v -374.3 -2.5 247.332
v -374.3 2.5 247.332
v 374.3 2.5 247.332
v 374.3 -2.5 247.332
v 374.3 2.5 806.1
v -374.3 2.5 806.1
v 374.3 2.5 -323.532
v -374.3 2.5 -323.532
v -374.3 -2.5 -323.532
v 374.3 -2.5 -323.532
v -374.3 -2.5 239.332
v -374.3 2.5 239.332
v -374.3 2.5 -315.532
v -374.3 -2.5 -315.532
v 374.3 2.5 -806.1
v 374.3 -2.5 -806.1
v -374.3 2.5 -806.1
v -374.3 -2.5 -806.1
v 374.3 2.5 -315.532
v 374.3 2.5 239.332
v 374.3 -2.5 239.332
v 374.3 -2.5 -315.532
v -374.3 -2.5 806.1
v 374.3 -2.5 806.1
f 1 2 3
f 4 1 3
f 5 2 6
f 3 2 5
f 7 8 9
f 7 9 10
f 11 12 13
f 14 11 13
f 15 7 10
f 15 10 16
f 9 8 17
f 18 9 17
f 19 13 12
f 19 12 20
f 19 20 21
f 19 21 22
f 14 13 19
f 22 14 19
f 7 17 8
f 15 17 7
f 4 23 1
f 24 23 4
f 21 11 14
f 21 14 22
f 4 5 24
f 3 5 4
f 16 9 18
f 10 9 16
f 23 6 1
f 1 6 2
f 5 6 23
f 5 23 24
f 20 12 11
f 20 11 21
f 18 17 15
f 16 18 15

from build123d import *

# Parameters (mm, degrees)
BOSS_EXTRUDE1_DEPTH             = 2.5
BOSS_EXTRUDE1_DEPTH_BACK        = 2.5
SKETCH1_W                       = 736.6
SKETCH1_H                       = 470.568
BOSS_EXTRUDE1_2_DEPTH           = 2.5
BOSS_EXTRUDE1_2_DEPTH_BACK      = 2.5
SKETCH1_H_2                     = 546.768
BOSS_EXTRUDE1_3_DEPTH           = 2.5
BOSS_EXTRUDE1_3_DEPTH_BACK      = 2.5
SKETCH1_H_3                     = 542.864
BOSS_EXTRUDE2_REACH             = 882.801
SKETCH2_W                       = 748.6
SKETCH2_H                       = 482.568
SKETCH2_W_2                     = 736.6
SKETCH2_H_2                     = 470.568
SKETCH2_H_3                     = 558.768
SKETCH2_H_4                     = 546.768
SKETCH2_H_5                     = 554.864
SKETCH2_H_6                     = 542.864
BOSS_EXTRUDE2_DIRECTION_2_REACH = 882.801


with BuildPart() as part:
    # Sketch1 → Boss-Extrude1 (new, two sides: drawn at the far end of the back side and taken through both)
    with BuildSketch(Plane(origin=(0, 0, 0), x_dir=(1, 0, 0), z_dir=(0, 1, 0)).offset(-BOSS_EXTRUDE1_DEPTH_BACK)):
        with Locations((0, 564.816)):
            Rectangle(SKETCH1_W, SKETCH1_H)
    extrude(amount=BOSS_EXTRUDE1_DEPTH + BOSS_EXTRUDE1_DEPTH_BACK)

    # Boss-Extrude2: up to this face of the body (flat: up to its plane)
    boss_extrude2_end = Plane(part.part.faces().sort_by_distance((0, 2.5, -564.816))[0])
    # Sketch2 → Boss-Extrude2 (add, up to the picked face)
    with BuildSketch(Plane(origin=(0, 0, 0), x_dir=(1, 0, 0), z_dir=(0, 1, 0)), mode=Mode.PRIVATE) as boss_extrude2_sk1:
        with Locations((0, 564.816)):
            Rectangle(SKETCH2_W, SKETCH2_H)
        with Locations((0, 564.816)):
            Rectangle(SKETCH2_W_2, SKETCH2_H_2, mode=Mode.SUBTRACT)
    boss_extrude2_tool1 = split(extrude(boss_extrude2_sk1.sketch, amount=BOSS_EXTRUDE2_REACH, mode=Mode.PRIVATE), bisect_by=boss_extrude2_end, keep=Keep.BOTH, mode=Mode.PRIVATE)
    # Sketch2 → Boss-Extrude2 (add, up to the picked face)
    with BuildSketch(Plane(origin=(0, 0, 0), x_dir=(1, 0, 0), z_dir=(0, 1, 0)), mode=Mode.PRIVATE) as boss_extrude2_sk2:
        with Locations((0, -526.716)):
            Rectangle(SKETCH2_W, SKETCH2_H_3)
        with Locations((0, -526.716)):
            Rectangle(SKETCH2_W_2, SKETCH2_H_4, mode=Mode.SUBTRACT)
    boss_extrude2_tool2 = split(extrude(boss_extrude2_sk2.sketch, amount=BOSS_EXTRUDE2_REACH, mode=Mode.PRIVATE), bisect_by=boss_extrude2_end, keep=Keep.BOTH, mode=Mode.PRIVATE)
    # Sketch2 → Boss-Extrude2 (add, up to the picked face)
    with BuildSketch(Plane(origin=(0, 0, 0), x_dir=(1, 0, 0), z_dir=(0, 1, 0)), mode=Mode.PRIVATE) as boss_extrude2_sk3:
        with Locations((0, 38.1)):
            Rectangle(SKETCH2_W, SKETCH2_H_5)
        with Locations((0, 38.1)):
            Rectangle(SKETCH2_W_2, SKETCH2_H_6, mode=Mode.SUBTRACT)
    boss_extrude2_tool3 = split(extrude(boss_extrude2_sk3.sketch, amount=BOSS_EXTRUDE2_REACH, mode=Mode.PRIVATE), bisect_by=boss_extrude2_end, keep=Keep.BOTH, mode=Mode.PRIVATE)


with BuildPart() as body_2:
    # Sketch1 → Boss-Extrude1 2 (new, two sides: drawn at the far end of the back side and taken through both)
    with BuildSketch(Plane(origin=(0, 0, 0), x_dir=(1, 0, 0), z_dir=(0, 1, 0)).offset(-BOSS_EXTRUDE1_2_DEPTH_BACK)):
        with Locations((0, -526.716)):
            Rectangle(SKETCH1_W, SKETCH1_H_2)
    extrude(amount=BOSS_EXTRUDE1_2_DEPTH + BOSS_EXTRUDE1_2_DEPTH_BACK)


with BuildPart() as body_3:
    # Sketch1 → Boss-Extrude1 3 (new, two sides: drawn at the far end of the back side and taken through both)
    with BuildSketch(Plane(origin=(0, 0, 0), x_dir=(1, 0, 0), z_dir=(0, 1, 0)).offset(-BOSS_EXTRUDE1_3_DEPTH_BACK)):
        with Locations((0, 38.1)):
            Rectangle(SKETCH1_W, SKETCH1_H_3)
    extrude(amount=BOSS_EXTRUDE1_3_DEPTH + BOSS_EXTRUDE1_3_DEPTH_BACK)


with BuildPart() as part_1:
    add(part.part)

    add(body_2.part)  # Boss-Extrude2 merges body 2

    add(body_3.part)  # Boss-Extrude2 merges body 3
    add(boss_extrude2_tool1.solids().sort_by(Axis((0, 0, -805.209341), (0, 1, 0)))[0])
    add(boss_extrude2_tool2.solids().sort_by(Axis((0, 0, 805.165857), (0, 1, 0)))[0])
    add(boss_extrude2_tool3.solids().sort_by(Axis((0, 0, -314.600187), (0, 1, 0)))[0])

    # Boss-Extrude2 direction 2: up to this face of the body (flat: up to its plane)
    boss_extrude2_direction_2_end = Plane(part_1.part.faces().sort_by_distance((0, -2.5, -564.816))[0])
    # Sketch2 → Boss-Extrude2 direction 2 (add, up to the picked face)
    with BuildSketch(Plane(origin=(0, 0, 0), x_dir=(1, 0, 0), z_dir=(0, 1, 0)), mode=Mode.PRIVATE) as boss_extrude2_direction_2_sk1:
        with Locations((0, 564.816)):
            Rectangle(SKETCH2_W, SKETCH2_H)
        with Locations((0, 564.816)):
            Rectangle(SKETCH2_W_2, SKETCH2_H_2, mode=Mode.SUBTRACT)
    boss_extrude2_direction_2_tool1 = split(extrude(boss_extrude2_direction_2_sk1.sketch, amount=-BOSS_EXTRUDE2_DIRECTION_2_REACH, mode=Mode.PRIVATE), bisect_by=boss_extrude2_direction_2_end, keep=Keep.BOTH, mode=Mode.PRIVATE)
    # Sketch2 → Boss-Extrude2 direction 2 (add, up to the picked face)
    with BuildSketch(Plane(origin=(0, 0, 0), x_dir=(1, 0, 0), z_dir=(0, 1, 0)), mode=Mode.PRIVATE) as boss_extrude2_direction_2_sk2:
        with Locations((0, -526.716)):
            Rectangle(SKETCH2_W, SKETCH2_H_3)
        with Locations((0, -526.716)):
            Rectangle(SKETCH2_W_2, SKETCH2_H_4, mode=Mode.SUBTRACT)
    boss_extrude2_direction_2_tool2 = split(extrude(boss_extrude2_direction_2_sk2.sketch, amount=-BOSS_EXTRUDE2_DIRECTION_2_REACH, mode=Mode.PRIVATE), bisect_by=boss_extrude2_direction_2_end, keep=Keep.BOTH, mode=Mode.PRIVATE)
    # Sketch2 → Boss-Extrude2 direction 2 (add, up to the picked face)
    with BuildSketch(Plane(origin=(0, 0, 0), x_dir=(1, 0, 0), z_dir=(0, 1, 0)), mode=Mode.PRIVATE) as boss_extrude2_direction_2_sk3:
        with Locations((0, 38.1)):
            Rectangle(SKETCH2_W, SKETCH2_H_5)
        with Locations((0, 38.1)):
            Rectangle(SKETCH2_W_2, SKETCH2_H_6, mode=Mode.SUBTRACT)
    boss_extrude2_direction_2_tool3 = split(extrude(boss_extrude2_direction_2_sk3.sketch, amount=-BOSS_EXTRUDE2_DIRECTION_2_REACH, mode=Mode.PRIVATE), bisect_by=boss_extrude2_direction_2_end, keep=Keep.BOTH, mode=Mode.PRIVATE)
    add(boss_extrude2_direction_2_tool1.solids().sort_by(Axis((0, 0, -805.209341), (0, -1, 0)))[0])
    add(boss_extrude2_direction_2_tool2.solids().sort_by(Axis((0, 0, 805.165857), (0, -1, 0)))[0])
    add(boss_extrude2_direction_2_tool3.solids().sort_by(Axis((0, 0, -314.600187), (0, -1, 0)))[0])


solid = part_1.part
